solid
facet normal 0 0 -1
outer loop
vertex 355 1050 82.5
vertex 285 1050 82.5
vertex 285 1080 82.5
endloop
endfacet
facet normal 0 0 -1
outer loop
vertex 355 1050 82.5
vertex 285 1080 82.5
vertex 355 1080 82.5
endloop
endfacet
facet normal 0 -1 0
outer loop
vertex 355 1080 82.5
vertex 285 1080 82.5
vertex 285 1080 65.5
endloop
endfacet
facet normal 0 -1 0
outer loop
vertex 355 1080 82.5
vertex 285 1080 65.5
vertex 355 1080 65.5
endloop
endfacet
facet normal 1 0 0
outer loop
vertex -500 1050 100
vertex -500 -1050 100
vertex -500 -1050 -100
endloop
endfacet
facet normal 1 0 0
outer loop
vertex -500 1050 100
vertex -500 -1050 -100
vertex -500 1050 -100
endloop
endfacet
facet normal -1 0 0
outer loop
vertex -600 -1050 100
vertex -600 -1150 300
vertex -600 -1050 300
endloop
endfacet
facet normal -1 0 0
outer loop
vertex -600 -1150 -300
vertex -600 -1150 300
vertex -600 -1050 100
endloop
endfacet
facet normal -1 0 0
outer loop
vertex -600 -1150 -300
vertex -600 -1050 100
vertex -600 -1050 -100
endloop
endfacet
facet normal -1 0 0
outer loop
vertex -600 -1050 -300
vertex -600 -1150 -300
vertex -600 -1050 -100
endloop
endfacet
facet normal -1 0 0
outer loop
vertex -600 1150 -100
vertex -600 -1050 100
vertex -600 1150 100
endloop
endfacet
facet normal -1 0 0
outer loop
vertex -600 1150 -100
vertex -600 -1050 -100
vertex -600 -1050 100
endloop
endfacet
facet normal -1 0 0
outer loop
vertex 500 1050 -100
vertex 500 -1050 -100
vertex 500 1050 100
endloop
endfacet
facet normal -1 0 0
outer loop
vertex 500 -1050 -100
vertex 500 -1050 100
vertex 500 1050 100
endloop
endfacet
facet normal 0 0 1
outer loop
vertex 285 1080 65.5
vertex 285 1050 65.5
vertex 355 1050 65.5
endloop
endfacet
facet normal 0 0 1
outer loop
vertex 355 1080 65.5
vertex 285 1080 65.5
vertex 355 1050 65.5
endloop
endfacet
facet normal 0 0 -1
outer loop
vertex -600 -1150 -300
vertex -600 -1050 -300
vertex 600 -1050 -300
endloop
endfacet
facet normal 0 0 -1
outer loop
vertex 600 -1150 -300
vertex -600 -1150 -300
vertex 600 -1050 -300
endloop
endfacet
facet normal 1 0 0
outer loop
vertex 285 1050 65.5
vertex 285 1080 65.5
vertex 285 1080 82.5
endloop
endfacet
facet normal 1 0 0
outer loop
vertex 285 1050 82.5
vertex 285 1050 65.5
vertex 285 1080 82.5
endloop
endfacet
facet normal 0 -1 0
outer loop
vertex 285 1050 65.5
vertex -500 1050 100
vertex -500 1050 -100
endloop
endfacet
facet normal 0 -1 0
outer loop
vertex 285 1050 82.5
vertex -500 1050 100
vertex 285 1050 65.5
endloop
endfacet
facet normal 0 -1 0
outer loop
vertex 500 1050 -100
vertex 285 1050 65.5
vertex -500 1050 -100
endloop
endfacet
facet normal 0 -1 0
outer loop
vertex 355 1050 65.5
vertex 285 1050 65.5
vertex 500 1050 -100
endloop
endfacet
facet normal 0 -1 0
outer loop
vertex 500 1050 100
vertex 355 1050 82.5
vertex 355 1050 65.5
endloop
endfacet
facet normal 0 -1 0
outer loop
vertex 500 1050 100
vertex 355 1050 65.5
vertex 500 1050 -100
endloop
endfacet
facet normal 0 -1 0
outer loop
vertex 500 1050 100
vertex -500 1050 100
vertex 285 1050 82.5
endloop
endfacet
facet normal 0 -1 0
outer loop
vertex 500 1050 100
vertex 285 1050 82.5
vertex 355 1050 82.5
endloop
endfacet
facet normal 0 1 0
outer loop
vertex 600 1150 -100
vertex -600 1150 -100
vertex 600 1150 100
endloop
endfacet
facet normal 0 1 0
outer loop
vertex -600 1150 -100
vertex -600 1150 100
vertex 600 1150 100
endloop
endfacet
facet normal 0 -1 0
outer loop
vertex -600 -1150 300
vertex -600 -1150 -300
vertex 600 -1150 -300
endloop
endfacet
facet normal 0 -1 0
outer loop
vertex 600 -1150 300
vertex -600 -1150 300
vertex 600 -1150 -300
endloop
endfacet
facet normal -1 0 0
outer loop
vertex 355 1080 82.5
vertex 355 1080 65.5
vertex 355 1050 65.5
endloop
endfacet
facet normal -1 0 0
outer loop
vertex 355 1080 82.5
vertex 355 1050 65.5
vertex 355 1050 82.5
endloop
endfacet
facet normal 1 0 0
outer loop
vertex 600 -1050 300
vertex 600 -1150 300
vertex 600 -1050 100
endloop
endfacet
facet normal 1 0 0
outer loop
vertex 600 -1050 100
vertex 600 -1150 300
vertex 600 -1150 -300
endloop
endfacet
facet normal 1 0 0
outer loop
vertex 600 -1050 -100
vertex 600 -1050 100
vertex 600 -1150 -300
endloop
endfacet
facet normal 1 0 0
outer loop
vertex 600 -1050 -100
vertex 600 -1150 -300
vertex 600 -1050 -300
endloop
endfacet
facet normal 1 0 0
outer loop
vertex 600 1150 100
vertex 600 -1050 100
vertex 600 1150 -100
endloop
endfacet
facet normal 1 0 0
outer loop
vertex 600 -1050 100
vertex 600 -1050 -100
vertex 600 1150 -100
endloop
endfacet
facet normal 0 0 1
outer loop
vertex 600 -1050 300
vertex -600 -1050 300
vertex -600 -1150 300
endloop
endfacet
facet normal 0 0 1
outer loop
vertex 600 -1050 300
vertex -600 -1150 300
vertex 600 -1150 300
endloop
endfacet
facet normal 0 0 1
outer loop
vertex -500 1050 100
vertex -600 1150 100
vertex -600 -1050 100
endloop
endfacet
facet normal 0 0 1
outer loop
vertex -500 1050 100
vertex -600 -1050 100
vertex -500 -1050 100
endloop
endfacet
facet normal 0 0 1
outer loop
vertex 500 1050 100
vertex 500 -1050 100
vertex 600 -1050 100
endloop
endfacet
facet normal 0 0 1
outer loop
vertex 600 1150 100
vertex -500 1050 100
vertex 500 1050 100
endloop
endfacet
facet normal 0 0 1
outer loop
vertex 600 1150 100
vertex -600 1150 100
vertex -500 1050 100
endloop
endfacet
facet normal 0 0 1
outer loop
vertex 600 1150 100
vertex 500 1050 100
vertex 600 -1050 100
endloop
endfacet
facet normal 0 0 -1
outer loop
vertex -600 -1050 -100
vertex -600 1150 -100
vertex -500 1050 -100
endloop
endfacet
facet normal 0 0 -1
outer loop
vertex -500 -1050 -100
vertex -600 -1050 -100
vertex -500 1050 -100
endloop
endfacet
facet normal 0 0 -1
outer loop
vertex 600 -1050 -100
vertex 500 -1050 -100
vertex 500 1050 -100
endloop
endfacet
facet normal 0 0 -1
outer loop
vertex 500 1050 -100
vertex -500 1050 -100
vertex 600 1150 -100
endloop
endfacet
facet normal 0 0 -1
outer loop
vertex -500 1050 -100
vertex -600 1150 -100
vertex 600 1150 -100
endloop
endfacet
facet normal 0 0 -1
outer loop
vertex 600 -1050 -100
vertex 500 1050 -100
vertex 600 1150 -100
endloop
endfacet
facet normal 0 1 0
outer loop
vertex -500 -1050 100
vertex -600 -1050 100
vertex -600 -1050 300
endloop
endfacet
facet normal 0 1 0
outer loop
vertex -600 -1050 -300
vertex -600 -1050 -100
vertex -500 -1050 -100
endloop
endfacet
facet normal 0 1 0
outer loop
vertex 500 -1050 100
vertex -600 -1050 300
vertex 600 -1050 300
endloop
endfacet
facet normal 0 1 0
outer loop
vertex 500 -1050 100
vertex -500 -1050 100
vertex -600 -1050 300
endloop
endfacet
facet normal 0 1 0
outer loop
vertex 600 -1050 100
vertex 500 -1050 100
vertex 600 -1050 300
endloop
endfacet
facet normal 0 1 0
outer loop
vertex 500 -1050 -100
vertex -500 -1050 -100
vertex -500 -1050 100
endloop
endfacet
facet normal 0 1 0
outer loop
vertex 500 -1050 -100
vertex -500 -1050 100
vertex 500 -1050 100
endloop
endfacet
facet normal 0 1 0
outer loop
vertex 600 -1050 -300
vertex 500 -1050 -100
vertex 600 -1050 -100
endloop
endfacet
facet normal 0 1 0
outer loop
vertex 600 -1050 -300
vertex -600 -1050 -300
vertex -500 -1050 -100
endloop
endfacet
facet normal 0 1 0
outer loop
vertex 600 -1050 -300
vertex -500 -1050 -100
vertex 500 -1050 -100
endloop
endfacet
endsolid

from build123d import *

# Parameters (mm, degrees)
ESBO_O1_W                     = 1200
ESBO_O1_H                     = 2300
ESBO_O1_W_2                   = 1000
ESBO_O1_H_2                   = 2100
EXTRUS_O_FINA1_DEPTH          = 100
RESSALTO_EXTRUS_O1_DEPTH      = 200
RESSALTO_EXTRUS_O1_DEPTH_BACK = 400
ESBO_O2_W                     = 1200
ESBO_O2_H                     = 100
ESBO_O3_W                     = 70
ESBO_O3_H                     = 17
CORTE_EXTRUS_O1_DEPTH         = 30


with BuildPart() as part:
    # Esboço1 → Extrusão-Fina1 (new, symmetric)
    with BuildSketch(Plane.XY):
        Rectangle(ESBO_O1_W, ESBO_O1_H)
        Rectangle(ESBO_O1_W_2, ESBO_O1_H_2, mode=Mode.SUBTRACT)
    extrude(amount=EXTRUS_O_FINA1_DEPTH, both=True)

    # Esboço2 → Ressalto-extrusão1 (add, two sides: drawn at the far end of the back side and taken through both)
    with BuildSketch(Plane.XY.offset(100).offset(-RESSALTO_EXTRUS_O1_DEPTH_BACK)):
        with Locations((0, -1100)):
            Rectangle(ESBO_O2_W, ESBO_O2_H)
    extrude(amount=RESSALTO_EXTRUS_O1_DEPTH + RESSALTO_EXTRUS_O1_DEPTH_BACK)

    # Esboço3 → Corte-extrusão1 (cut)
    with BuildSketch(Plane.XZ.offset(-1050)):
        with Locations((320, 74)):
            Rectangle(ESBO_O3_W, ESBO_O3_H)
    extrude(amount=-CORTE_EXTRUS_O1_DEPTH, mode=Mode.SUBTRACT)


solid = part.part
